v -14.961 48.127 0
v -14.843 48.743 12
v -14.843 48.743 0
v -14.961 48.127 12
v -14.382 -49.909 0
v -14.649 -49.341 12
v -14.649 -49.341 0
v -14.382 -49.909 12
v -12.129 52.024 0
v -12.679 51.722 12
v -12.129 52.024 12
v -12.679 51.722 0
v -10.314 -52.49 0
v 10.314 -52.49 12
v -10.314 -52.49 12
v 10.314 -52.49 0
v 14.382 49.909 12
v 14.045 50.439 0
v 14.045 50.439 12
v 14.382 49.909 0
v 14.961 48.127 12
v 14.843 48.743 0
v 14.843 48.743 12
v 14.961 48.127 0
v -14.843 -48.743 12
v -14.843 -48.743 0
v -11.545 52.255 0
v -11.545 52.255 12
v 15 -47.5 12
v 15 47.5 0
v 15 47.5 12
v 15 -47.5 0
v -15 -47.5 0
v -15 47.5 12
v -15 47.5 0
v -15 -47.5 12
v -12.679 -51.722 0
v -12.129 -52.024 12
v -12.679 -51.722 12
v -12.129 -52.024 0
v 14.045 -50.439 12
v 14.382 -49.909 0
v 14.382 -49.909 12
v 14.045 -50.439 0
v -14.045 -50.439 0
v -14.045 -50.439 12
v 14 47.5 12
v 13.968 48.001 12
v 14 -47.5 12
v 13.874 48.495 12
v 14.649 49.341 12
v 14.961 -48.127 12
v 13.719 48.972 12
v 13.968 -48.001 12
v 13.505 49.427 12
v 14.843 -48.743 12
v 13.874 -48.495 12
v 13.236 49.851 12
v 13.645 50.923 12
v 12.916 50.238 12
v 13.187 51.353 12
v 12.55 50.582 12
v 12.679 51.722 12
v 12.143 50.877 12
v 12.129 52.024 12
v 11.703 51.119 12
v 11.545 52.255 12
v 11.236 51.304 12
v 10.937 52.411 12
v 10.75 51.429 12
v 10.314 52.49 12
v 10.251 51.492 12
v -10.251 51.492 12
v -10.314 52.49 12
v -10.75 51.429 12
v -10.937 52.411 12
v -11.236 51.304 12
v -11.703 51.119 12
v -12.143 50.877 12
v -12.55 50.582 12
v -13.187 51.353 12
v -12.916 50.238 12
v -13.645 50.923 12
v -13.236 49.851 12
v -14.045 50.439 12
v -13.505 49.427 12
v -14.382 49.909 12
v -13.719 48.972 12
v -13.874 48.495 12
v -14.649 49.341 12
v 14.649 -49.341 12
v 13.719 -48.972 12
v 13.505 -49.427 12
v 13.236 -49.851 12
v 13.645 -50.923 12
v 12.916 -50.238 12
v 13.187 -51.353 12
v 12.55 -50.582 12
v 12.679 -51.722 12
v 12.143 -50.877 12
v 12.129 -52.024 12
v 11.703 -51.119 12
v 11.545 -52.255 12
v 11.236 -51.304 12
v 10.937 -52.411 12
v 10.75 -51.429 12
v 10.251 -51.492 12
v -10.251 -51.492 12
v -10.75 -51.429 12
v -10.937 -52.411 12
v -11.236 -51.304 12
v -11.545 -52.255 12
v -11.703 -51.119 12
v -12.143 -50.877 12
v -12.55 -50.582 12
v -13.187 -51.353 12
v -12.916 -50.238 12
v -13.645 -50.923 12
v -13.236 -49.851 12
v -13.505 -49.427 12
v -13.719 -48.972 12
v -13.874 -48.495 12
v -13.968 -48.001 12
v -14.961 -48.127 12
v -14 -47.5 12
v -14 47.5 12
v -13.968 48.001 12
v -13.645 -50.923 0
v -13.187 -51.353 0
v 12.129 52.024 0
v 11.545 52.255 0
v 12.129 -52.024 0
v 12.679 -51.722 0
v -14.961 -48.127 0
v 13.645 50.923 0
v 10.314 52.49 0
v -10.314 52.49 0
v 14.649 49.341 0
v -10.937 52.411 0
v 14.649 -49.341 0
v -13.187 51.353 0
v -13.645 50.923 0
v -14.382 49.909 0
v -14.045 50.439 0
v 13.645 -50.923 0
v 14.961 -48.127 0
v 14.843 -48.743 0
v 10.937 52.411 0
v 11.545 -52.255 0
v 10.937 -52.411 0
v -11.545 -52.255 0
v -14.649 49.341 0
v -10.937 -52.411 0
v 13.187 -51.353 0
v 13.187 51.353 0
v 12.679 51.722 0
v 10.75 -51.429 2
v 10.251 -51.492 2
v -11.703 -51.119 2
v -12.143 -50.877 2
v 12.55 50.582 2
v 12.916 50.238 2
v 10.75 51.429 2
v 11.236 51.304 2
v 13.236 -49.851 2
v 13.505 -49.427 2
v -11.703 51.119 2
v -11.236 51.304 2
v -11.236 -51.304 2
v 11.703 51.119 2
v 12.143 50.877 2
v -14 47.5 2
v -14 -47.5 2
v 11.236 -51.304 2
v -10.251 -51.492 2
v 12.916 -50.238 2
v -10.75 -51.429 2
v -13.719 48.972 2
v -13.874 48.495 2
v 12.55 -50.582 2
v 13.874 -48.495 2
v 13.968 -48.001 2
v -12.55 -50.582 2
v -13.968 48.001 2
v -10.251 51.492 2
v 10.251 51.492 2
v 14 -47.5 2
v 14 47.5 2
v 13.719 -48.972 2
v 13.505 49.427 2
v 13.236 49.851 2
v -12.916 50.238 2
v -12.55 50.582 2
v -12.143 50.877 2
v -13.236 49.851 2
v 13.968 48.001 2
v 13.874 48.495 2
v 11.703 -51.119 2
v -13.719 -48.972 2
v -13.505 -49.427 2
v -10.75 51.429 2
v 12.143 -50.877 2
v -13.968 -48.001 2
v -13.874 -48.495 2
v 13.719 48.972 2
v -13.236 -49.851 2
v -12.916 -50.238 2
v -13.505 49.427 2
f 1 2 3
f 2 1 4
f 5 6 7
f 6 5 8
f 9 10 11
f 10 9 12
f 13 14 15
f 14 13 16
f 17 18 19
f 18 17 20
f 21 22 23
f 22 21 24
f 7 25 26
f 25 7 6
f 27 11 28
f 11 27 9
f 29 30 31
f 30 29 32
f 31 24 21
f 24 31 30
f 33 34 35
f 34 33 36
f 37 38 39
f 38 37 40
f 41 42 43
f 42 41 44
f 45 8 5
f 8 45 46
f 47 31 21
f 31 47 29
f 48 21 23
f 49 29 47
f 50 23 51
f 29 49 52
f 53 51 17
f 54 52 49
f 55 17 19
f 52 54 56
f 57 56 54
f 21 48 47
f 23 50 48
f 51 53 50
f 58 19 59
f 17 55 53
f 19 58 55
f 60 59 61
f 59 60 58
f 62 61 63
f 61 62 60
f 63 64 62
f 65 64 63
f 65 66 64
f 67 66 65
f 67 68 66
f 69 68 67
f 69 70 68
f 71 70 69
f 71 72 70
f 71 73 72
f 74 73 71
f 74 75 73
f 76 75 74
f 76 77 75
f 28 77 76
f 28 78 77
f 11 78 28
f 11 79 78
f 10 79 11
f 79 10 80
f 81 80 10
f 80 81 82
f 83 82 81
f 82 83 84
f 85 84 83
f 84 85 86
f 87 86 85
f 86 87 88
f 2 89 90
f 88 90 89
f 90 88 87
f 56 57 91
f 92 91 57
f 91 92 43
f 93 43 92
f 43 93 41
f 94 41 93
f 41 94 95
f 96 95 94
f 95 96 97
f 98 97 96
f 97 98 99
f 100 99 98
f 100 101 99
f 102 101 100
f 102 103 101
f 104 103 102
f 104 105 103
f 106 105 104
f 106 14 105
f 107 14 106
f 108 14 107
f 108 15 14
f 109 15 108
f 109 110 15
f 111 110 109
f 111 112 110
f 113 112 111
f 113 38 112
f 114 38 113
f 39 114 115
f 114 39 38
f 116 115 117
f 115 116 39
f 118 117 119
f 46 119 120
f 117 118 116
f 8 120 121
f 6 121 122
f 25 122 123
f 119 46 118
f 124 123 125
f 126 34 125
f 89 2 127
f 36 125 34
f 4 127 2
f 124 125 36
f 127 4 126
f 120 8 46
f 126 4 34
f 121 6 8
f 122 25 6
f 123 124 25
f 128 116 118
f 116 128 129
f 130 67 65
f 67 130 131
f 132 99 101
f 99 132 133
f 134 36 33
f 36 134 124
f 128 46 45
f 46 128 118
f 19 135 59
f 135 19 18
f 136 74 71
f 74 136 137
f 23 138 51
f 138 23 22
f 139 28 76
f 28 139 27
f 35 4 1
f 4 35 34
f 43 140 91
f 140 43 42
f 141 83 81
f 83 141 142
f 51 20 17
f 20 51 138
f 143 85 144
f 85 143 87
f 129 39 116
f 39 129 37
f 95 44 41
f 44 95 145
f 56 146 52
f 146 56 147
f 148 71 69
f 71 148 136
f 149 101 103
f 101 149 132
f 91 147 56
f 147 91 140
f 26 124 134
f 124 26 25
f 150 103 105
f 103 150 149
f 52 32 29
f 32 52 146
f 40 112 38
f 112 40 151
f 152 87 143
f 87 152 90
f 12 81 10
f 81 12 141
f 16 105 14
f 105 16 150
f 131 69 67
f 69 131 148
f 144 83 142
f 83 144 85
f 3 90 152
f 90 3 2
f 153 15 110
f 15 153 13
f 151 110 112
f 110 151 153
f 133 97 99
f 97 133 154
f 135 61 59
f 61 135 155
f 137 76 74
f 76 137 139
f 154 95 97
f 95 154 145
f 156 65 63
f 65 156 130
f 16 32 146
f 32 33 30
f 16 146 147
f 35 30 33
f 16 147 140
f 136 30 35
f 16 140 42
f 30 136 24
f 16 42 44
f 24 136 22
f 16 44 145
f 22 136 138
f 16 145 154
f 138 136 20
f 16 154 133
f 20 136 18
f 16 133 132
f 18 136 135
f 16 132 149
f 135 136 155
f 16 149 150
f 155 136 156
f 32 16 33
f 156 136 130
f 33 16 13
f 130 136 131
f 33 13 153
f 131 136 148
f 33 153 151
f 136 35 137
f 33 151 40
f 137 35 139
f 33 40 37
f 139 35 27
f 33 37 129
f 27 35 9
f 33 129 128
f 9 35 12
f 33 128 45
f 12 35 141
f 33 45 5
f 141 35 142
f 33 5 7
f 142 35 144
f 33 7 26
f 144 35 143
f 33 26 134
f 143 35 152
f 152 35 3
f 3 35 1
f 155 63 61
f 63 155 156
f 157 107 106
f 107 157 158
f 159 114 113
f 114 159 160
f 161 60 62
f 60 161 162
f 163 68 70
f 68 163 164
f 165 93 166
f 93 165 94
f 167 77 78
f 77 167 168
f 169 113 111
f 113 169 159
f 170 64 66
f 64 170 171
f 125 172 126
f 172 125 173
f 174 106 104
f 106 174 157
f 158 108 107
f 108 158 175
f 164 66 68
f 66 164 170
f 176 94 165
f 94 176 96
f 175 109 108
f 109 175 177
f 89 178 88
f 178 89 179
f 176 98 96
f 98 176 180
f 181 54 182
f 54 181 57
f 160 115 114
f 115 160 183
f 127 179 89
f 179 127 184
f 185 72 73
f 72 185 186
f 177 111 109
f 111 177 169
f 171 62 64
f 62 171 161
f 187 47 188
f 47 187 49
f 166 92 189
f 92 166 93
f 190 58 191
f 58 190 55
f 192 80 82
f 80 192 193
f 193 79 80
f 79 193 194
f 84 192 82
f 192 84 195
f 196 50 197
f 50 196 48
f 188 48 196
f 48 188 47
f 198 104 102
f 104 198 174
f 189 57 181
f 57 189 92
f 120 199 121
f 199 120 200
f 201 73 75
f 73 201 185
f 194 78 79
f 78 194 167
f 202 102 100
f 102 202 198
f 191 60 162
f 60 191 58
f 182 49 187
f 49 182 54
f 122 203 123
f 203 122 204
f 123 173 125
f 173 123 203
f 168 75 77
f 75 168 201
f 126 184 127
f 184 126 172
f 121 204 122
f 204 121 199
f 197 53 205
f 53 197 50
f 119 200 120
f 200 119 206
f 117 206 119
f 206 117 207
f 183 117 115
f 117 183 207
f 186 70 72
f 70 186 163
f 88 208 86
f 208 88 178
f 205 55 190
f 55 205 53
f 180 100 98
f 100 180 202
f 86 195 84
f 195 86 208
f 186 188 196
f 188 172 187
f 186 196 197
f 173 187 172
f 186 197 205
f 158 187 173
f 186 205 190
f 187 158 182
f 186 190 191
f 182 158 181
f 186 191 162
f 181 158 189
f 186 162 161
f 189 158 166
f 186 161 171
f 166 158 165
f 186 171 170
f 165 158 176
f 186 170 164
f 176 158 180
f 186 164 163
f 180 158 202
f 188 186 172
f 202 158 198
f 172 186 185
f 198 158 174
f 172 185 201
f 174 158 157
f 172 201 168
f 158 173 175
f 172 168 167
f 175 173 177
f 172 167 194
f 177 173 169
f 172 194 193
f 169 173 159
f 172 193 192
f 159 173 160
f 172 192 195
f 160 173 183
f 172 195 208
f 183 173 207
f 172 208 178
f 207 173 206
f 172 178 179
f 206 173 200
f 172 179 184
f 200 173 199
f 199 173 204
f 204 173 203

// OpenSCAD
$fn = 50;


difference() {
	union() {
		hull() {
			translate(v = [-10.0000000000, 47.5000000000, 0]) {
				cylinder(h = 12, r = 5);
			}
			translate(v = [10.0000000000, 47.5000000000, 0]) {
				cylinder(h = 12, r = 5);
			}
			translate(v = [-10.0000000000, -47.5000000000, 0]) {
				cylinder(h = 12, r = 5);
			}
			translate(v = [10.0000000000, -47.5000000000, 0]) {
				cylinder(h = 12, r = 5);
			}
		}
	}
	union() {
		translate(v = [0, 0, 2]) {
			hull() {
				translate(v = [-10.0000000000, 47.5000000000, 0]) {
					cylinder(h = 10, r = 4);
				}
				translate(v = [10.0000000000, 47.5000000000, 0]) {
					cylinder(h = 10, r = 4);
				}
				translate(v = [-10.0000000000, -47.5000000000, 0]) {
					cylinder(h = 10, r = 4);
				}
				translate(v = [10.0000000000, -47.5000000000, 0]) {
					cylinder(h = 10, r = 4);
				}
			}
		}
	}
}
